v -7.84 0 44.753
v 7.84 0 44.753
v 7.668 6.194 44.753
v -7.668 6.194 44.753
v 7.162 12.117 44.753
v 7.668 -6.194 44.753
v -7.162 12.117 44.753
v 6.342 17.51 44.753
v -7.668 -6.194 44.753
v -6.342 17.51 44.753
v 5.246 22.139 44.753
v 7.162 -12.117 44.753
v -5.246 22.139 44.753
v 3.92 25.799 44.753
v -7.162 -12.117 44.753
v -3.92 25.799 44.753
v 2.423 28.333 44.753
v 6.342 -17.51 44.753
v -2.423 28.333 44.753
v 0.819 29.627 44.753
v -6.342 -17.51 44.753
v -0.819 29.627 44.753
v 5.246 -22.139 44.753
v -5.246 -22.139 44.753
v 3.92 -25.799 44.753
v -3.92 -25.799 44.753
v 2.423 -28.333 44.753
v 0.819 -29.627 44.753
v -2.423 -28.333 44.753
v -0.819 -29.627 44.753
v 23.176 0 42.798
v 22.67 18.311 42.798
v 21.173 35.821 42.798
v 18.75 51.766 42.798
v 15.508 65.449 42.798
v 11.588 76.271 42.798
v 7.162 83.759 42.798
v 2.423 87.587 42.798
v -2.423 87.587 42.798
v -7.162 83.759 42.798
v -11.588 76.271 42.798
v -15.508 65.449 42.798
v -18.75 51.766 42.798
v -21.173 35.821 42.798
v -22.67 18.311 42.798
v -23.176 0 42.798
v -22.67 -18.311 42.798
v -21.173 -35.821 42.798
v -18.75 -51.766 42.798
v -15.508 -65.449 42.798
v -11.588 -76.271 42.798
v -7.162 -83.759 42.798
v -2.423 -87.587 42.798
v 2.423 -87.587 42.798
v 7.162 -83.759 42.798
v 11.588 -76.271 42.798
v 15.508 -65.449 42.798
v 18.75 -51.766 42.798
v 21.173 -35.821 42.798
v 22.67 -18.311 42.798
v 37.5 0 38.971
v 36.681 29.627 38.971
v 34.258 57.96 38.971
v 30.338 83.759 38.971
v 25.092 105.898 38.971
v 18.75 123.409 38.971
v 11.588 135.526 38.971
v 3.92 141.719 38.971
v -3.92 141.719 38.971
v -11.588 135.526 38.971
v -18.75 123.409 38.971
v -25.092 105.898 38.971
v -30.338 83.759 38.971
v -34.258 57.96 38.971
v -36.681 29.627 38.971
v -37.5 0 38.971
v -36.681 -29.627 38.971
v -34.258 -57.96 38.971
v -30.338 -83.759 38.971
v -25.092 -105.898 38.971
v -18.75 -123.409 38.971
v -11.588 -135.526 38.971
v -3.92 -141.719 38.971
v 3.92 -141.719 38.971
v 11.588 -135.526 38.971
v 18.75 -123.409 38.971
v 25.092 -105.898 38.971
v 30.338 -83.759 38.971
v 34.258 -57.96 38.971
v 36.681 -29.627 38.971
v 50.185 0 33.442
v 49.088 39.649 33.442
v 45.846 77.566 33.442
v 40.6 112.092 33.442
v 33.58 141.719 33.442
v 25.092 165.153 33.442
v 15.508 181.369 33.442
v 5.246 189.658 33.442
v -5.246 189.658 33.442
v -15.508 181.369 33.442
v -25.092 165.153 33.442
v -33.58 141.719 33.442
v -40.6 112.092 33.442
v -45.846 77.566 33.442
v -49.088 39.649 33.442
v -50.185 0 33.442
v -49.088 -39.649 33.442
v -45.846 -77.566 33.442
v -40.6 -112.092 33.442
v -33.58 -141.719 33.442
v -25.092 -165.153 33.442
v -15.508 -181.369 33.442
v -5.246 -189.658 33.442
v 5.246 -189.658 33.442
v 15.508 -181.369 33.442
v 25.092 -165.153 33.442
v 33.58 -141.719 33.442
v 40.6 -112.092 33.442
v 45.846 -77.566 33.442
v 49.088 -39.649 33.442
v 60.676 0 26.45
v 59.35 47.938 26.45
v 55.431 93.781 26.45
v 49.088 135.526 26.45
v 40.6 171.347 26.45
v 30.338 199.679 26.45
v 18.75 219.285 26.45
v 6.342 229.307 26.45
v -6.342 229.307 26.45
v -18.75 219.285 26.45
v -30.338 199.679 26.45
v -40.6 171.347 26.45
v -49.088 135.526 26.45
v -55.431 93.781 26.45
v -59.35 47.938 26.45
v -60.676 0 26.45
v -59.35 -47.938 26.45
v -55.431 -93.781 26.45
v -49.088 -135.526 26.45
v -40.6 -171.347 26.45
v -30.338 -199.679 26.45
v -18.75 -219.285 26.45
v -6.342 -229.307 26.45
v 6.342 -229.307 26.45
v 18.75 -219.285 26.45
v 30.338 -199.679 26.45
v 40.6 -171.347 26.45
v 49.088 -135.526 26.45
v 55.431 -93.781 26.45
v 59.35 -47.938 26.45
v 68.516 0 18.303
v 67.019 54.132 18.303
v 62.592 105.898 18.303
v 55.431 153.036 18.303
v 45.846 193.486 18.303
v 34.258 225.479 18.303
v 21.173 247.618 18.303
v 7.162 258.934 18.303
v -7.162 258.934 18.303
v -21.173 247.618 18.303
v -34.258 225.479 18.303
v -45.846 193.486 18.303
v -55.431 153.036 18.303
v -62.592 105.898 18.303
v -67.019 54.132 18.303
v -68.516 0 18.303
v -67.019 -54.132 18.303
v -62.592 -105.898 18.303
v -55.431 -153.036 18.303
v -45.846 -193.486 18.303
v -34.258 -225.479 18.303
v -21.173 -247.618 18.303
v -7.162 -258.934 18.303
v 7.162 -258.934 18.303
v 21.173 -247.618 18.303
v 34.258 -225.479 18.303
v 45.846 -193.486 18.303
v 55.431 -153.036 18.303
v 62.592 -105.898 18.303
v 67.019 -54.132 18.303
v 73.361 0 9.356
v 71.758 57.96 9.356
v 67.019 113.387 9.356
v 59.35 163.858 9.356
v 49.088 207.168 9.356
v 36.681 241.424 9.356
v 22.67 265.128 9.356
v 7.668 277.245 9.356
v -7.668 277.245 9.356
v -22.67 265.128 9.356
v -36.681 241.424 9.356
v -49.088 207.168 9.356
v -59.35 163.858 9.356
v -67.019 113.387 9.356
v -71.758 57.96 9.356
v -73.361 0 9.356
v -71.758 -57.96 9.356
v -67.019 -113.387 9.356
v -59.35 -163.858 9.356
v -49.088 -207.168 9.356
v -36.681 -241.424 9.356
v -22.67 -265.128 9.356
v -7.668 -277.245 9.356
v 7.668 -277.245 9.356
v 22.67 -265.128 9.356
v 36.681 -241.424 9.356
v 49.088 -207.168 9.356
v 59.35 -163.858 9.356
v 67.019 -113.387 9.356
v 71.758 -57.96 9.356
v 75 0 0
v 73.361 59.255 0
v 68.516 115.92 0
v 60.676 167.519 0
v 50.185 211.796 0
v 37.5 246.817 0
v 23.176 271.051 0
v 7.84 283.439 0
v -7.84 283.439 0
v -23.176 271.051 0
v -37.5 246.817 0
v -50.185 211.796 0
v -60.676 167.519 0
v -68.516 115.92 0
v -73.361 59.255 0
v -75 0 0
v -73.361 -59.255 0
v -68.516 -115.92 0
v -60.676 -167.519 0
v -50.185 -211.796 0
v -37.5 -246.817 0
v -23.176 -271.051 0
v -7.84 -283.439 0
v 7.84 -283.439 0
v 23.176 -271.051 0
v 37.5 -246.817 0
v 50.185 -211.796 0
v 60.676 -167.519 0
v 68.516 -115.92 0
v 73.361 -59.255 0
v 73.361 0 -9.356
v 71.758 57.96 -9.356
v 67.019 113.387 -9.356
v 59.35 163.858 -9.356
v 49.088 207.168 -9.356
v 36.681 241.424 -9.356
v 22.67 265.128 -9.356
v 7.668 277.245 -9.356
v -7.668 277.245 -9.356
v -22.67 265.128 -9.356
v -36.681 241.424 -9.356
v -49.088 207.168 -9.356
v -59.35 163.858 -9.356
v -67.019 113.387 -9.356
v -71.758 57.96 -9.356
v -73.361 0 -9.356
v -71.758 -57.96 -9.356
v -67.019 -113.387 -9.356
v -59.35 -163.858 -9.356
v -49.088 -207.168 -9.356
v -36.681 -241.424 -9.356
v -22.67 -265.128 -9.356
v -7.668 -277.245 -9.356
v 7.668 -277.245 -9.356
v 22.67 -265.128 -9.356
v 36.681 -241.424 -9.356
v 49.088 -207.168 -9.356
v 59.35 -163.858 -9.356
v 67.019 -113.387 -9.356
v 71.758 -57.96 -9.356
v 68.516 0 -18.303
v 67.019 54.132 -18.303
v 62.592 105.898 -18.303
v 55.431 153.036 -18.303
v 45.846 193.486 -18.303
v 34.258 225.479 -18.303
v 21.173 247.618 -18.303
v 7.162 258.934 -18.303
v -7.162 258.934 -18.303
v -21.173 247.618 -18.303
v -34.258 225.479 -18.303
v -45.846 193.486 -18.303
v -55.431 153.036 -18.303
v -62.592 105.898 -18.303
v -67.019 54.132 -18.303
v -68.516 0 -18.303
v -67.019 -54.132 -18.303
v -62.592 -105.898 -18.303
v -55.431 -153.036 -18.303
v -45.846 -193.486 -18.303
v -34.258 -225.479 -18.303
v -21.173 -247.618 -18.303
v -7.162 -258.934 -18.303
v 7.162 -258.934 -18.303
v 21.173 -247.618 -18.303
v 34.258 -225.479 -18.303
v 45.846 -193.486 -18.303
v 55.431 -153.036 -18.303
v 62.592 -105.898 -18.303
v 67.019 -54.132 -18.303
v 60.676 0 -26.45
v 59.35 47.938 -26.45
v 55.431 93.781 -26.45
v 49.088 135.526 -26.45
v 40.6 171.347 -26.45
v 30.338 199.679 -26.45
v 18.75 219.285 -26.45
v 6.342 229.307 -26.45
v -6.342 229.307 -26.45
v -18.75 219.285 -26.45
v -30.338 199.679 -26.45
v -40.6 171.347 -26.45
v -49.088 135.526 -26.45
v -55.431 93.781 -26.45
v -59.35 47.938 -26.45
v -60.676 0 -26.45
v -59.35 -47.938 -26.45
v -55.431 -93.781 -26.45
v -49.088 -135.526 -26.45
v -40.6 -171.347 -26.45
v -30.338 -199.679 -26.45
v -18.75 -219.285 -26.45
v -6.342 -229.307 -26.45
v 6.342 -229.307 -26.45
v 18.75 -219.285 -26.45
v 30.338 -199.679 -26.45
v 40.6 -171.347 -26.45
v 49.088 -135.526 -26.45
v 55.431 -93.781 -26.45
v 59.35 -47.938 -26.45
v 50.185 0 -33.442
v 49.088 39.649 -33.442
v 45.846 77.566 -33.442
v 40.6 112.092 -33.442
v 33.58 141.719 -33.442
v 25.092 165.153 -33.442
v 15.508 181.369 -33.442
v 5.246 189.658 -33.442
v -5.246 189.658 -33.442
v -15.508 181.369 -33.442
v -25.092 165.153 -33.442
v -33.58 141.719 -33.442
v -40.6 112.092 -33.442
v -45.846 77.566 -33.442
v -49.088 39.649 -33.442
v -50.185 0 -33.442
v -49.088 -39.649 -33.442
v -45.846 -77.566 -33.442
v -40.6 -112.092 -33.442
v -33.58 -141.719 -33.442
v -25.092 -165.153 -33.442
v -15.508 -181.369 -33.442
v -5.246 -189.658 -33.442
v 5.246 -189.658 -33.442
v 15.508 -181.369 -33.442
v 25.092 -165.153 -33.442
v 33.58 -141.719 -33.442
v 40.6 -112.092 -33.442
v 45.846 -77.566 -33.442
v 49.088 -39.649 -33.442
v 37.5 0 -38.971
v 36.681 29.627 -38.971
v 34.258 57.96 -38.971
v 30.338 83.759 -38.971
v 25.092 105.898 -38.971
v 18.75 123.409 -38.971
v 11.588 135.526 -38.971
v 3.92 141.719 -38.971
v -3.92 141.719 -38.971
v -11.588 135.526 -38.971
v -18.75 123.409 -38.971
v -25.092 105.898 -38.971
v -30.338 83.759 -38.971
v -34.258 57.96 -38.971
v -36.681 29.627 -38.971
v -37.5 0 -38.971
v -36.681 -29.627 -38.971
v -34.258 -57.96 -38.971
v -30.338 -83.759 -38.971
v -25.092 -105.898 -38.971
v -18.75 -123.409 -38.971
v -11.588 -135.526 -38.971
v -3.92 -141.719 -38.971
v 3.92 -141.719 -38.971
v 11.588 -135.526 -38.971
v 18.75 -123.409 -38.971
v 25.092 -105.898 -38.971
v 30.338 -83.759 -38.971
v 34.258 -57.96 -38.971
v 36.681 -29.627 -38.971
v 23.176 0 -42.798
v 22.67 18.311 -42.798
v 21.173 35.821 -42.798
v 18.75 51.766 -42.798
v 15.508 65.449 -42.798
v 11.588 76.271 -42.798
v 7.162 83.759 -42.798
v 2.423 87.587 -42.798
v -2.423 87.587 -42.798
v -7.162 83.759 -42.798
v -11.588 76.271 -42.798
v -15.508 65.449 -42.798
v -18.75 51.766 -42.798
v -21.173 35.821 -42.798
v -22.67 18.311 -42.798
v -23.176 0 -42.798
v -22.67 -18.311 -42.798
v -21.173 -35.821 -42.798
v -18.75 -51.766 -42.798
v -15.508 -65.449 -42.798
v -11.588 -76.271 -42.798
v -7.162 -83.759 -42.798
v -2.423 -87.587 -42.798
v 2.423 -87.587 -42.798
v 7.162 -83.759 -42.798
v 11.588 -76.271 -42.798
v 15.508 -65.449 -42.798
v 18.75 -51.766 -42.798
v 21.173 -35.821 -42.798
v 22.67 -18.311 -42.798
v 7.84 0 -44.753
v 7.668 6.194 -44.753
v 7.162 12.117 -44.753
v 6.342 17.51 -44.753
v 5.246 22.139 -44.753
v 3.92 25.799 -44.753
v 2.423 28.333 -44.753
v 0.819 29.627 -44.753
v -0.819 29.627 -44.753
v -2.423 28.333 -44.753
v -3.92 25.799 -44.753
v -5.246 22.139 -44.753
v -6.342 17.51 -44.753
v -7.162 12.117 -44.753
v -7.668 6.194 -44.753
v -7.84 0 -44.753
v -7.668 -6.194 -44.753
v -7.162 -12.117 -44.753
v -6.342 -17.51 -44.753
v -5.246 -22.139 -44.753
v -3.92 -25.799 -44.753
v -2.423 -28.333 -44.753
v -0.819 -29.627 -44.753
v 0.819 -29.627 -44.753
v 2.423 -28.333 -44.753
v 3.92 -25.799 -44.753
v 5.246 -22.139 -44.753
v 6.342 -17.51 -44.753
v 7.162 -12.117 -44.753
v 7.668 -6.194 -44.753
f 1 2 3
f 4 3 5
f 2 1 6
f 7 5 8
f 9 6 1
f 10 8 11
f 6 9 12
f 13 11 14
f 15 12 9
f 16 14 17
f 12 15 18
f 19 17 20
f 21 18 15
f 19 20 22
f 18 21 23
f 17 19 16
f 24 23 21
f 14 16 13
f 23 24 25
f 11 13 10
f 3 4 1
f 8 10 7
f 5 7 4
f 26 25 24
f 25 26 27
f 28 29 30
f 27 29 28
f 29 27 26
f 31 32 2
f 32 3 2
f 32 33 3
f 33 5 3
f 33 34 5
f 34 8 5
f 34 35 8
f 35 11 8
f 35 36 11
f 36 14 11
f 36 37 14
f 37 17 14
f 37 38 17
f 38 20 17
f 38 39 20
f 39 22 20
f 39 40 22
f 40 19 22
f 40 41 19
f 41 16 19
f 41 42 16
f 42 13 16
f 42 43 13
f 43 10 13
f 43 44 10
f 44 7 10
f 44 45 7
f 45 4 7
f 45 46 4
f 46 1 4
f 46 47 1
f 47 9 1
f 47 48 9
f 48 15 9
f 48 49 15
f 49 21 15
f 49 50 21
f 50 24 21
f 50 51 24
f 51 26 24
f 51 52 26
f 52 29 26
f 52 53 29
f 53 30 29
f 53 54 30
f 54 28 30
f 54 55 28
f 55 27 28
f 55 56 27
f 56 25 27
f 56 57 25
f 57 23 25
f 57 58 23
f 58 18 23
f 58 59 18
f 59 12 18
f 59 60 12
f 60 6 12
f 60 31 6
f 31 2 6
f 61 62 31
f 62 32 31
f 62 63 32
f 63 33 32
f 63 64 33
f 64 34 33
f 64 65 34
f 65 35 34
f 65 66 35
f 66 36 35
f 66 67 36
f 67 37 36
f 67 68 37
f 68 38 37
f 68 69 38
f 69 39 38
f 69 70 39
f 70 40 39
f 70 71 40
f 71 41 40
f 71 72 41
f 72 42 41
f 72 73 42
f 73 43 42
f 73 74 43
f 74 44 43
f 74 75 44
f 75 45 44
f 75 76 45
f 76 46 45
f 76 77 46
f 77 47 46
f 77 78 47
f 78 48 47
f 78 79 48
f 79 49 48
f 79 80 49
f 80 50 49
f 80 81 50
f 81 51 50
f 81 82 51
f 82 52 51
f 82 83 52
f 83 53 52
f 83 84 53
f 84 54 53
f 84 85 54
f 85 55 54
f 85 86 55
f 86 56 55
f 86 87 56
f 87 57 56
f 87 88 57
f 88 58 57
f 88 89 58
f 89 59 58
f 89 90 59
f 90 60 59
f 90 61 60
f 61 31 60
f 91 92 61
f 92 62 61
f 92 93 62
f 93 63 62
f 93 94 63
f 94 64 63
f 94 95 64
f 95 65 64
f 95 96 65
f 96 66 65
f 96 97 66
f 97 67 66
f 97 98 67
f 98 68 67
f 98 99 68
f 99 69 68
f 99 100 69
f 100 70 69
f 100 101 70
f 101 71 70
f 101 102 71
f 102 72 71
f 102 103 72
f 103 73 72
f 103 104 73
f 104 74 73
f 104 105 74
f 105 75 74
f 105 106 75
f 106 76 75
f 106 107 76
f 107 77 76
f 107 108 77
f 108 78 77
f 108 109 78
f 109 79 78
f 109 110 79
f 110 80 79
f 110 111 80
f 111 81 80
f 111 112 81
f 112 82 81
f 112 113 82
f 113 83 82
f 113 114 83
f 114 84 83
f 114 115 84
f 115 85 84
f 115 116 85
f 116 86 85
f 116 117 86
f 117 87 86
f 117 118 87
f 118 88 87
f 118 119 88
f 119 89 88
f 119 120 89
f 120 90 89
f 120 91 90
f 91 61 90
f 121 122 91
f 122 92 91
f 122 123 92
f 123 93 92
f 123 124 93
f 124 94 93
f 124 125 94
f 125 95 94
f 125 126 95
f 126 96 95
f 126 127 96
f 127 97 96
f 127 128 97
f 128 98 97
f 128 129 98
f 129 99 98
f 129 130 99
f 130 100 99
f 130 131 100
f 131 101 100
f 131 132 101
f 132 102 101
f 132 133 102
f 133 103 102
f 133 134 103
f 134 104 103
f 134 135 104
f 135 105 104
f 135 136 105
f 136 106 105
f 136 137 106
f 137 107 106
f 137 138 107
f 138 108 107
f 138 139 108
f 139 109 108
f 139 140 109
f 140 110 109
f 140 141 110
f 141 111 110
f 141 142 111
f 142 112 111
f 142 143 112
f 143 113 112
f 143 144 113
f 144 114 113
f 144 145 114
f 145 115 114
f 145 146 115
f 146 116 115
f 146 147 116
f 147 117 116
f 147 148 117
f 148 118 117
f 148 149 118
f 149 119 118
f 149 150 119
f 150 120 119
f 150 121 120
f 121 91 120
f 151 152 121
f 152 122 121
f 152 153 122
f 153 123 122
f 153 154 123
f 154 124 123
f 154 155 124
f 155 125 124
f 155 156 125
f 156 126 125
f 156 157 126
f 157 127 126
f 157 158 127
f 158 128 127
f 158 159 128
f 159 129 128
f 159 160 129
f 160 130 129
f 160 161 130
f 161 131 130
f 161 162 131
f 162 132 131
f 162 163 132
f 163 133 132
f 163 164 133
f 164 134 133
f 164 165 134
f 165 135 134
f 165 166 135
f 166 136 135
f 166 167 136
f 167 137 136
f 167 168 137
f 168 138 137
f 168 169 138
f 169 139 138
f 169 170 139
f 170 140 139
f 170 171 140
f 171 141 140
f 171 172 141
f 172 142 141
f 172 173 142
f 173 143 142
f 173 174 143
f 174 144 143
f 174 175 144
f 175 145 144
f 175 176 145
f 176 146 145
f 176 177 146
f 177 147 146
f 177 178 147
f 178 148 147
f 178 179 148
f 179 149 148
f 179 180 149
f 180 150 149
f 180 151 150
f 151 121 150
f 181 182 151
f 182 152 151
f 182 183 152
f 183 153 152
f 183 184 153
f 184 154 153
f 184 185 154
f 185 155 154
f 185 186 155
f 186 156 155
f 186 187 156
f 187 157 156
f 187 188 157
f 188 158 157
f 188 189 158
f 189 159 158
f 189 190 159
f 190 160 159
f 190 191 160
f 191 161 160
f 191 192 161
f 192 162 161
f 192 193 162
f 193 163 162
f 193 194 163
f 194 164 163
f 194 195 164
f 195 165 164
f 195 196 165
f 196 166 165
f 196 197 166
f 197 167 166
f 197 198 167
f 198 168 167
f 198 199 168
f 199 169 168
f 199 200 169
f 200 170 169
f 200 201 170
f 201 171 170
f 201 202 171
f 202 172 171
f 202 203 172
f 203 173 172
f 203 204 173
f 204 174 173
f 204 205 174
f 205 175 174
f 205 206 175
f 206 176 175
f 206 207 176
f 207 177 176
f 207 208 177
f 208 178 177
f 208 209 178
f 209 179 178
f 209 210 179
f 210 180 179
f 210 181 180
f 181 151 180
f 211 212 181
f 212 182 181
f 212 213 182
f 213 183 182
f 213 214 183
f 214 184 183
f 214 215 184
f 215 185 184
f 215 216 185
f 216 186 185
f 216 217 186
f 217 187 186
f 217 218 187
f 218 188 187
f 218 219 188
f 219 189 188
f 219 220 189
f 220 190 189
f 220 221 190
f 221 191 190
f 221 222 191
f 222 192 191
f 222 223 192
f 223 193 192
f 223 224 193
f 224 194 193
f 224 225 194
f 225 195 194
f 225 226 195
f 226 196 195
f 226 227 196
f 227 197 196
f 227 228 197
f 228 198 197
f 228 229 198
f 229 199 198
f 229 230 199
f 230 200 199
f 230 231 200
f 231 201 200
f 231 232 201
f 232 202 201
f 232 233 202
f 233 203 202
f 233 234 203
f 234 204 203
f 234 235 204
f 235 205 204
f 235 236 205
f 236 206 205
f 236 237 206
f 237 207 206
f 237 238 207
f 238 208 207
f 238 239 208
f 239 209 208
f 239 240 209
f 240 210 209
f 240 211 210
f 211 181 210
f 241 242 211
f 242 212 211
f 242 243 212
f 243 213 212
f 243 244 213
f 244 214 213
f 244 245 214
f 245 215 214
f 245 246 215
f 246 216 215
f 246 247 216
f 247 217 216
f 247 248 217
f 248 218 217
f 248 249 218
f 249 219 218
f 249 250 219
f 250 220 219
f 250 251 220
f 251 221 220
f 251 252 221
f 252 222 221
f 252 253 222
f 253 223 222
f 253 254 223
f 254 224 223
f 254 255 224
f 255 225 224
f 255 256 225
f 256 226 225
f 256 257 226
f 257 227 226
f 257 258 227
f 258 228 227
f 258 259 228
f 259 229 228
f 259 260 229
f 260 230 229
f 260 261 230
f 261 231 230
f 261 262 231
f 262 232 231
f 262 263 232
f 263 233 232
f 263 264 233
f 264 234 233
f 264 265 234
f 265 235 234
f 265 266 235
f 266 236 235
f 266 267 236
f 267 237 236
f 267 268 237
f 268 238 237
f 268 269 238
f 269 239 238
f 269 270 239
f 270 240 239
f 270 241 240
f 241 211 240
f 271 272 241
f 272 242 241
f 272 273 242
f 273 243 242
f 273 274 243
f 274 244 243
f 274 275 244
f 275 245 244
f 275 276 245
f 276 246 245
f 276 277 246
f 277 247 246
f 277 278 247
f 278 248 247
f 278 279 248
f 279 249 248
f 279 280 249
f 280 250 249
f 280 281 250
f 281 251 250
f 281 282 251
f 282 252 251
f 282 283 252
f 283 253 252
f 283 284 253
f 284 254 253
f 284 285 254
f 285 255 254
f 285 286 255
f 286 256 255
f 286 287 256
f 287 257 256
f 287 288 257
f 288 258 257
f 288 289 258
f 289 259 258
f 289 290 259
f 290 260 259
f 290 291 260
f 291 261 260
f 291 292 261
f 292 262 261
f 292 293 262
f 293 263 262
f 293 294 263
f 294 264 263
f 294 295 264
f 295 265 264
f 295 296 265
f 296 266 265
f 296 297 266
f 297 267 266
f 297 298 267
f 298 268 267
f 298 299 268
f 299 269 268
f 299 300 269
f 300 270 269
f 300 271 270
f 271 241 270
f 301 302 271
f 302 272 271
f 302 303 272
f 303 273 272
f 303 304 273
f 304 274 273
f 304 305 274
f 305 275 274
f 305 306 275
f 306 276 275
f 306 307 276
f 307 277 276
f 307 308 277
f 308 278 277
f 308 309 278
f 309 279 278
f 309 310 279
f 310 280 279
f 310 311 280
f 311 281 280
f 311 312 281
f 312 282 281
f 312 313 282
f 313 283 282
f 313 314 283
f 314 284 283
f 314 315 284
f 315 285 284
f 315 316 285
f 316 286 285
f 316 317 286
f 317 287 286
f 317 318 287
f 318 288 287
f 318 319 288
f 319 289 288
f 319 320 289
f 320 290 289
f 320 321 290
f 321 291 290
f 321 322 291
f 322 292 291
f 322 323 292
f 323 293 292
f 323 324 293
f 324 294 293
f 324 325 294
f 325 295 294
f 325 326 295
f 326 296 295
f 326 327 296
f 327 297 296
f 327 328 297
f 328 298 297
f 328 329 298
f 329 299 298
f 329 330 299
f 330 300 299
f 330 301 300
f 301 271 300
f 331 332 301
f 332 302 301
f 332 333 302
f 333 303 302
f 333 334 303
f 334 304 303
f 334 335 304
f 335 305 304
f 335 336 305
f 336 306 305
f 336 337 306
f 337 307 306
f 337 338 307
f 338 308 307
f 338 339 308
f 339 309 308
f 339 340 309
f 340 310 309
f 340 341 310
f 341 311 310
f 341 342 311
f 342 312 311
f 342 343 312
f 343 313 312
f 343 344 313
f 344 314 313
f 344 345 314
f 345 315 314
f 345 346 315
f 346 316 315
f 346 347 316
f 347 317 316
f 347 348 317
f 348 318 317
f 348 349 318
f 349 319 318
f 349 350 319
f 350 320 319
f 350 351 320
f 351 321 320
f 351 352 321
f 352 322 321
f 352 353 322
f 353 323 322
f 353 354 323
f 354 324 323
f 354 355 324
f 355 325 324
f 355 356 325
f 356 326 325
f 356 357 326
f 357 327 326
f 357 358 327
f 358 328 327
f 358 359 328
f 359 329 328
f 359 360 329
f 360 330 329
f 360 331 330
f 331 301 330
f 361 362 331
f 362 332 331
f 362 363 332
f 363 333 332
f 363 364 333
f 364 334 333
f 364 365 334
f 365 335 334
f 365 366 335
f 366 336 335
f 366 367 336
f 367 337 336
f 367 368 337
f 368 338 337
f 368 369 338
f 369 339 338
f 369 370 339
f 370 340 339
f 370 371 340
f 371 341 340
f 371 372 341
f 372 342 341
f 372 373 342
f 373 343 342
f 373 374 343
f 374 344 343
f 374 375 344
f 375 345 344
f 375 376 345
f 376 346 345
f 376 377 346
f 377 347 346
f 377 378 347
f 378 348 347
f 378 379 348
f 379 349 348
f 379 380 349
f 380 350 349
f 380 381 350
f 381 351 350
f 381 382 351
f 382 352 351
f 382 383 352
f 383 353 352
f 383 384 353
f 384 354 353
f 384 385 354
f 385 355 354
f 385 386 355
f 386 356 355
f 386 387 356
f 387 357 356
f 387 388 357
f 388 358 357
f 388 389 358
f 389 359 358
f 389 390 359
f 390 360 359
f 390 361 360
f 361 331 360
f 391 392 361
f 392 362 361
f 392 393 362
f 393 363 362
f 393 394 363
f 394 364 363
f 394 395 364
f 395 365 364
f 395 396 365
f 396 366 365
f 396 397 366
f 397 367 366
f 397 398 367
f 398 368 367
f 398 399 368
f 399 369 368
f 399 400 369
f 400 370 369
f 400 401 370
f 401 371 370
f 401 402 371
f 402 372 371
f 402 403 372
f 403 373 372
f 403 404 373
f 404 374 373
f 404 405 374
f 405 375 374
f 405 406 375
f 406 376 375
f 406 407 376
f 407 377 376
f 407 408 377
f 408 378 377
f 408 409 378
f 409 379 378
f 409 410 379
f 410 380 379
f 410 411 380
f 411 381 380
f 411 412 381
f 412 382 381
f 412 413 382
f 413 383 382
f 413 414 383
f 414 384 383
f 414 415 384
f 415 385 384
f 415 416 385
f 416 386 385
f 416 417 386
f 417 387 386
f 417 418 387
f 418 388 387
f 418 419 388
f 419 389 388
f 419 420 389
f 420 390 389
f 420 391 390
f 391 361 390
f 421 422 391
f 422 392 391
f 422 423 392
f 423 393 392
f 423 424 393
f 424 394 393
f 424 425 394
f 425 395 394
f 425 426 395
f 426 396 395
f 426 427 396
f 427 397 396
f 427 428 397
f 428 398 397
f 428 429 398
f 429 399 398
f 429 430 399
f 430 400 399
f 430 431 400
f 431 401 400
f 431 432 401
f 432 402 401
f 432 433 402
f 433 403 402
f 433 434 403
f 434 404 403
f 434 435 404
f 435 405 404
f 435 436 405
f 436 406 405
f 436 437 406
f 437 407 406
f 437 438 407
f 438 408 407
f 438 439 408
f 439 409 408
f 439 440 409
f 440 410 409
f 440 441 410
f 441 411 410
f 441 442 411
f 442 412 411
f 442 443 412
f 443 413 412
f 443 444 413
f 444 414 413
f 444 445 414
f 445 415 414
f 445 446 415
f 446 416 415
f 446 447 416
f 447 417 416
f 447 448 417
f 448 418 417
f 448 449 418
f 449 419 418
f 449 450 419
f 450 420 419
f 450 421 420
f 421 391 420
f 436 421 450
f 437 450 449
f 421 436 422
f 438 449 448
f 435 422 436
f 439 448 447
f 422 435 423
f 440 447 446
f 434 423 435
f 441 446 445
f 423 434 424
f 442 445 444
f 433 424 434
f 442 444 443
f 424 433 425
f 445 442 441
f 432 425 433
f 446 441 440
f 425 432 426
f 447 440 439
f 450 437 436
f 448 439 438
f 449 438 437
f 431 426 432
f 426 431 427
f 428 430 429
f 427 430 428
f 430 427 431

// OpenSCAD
// Generated by SolidPython 1.0.1 on 2020-07-29 00:46:47


scale(v = [5, 19, 3]) {
	sphere(r = 15);
}
/***********************************************
*********      SolidPython code:      **********
************************************************
 
# import packages: SolidPython
from solid import *
from solid.utils import *
from itertools import chain, combinations, permutations


class Resize:

    def __init__(self, scad_file):
        self.scad_file = scad_file
        #self.scad_file = import_scad(scad_file)
        # cone/cylinder param:
        self.r1 = 0
        self.r2 = 0
        self.h = 0
        # rectangular prism param:
        self.w = 0
        self.l = 0
        # ellipse param:
        self.r = 0

    # import OpenScad code (file name corresponds to shape)


    # classify shape + parameters
    def assign(self, param1, param2, param3):
        if self.scad_file == 'cone.scad':
            self.r1 = param1
            self.r2 = param2
            self.h = param3
        elif self.scad_file == 'cylinder.scad':
            self.r1 = param1
            self.r2 = param2
            self.h = param3
        elif self.scad_file == 'rectangularPrism.scad':
            self.h = param1
            self.l = param2
            self.w = param3
        else:
            self.r = param1
            self.h = param2

    # resize parameters
    def iterate(self):
        x = range(3, 20, 2)
        i = 1
        if self.scad_file == 'cone.scad':
            tempList = list(permutations(x, 2))
            for temp in tempList:
                param1 = temp[0]
                param2 = temp[1]
                filepath = 'produced_scad_files/' + 'cone' + str(param1) + '_' + str(param2) + '_' + '.scad'
                scad_render_to_file(cylinder(h=param1, r1=param2, r2=0), filepath)

        elif self.scad_file == 'cylinder.scad':
            tempList = list(permutations(x, 3))
            for temp in tempList:
                param1 = temp[0]
                param2 = temp[1]
                filepath = 'produced_scad_files/' + 'cylinder' + str(param1) + '_' + str(param2) + '_' + '.scad'
                scad_render_to_file(cylinder(h=param1, r1=param2, r2=param2), filepath)

        elif self.scad_file == 'rectangularPrism.scad':
            tempList = list(permutations(x, 3))
            for temp in tempList:
                param1 = temp[0]
                param2 = temp[1]
                param3 = temp[2]
                filepath = 'produced_scad_files/' + 'rectangularPrism' + str(param1) + '_' + str(param2) + '_' + str(
                    param3) + '.scad'
                scad_render_to_file(cube(size=(param1, param2, param3)), filepath)

        elif self.scad_file == 'ellipse.scad':
            tempList = list(permutations(x, 4))
            for temp in tempList:
                param1 = temp[0]
                param2 = temp[1]
                param3 = temp[2]
                param4 = temp[3]
                filepath = 'produced_scad_files/' + 'ellipse' + str(param1) + '_' + str(param2) + '_' + str(param3) + '_' + str(param4) + '.scad'
                scad_render_to_file(scale([param1, param2, param3])(sphere(r=param4)), filepath)

    def render_to_scadfile(self):
        scad_render_to_file(scad, 'example.scad') 
 
************************************************/
